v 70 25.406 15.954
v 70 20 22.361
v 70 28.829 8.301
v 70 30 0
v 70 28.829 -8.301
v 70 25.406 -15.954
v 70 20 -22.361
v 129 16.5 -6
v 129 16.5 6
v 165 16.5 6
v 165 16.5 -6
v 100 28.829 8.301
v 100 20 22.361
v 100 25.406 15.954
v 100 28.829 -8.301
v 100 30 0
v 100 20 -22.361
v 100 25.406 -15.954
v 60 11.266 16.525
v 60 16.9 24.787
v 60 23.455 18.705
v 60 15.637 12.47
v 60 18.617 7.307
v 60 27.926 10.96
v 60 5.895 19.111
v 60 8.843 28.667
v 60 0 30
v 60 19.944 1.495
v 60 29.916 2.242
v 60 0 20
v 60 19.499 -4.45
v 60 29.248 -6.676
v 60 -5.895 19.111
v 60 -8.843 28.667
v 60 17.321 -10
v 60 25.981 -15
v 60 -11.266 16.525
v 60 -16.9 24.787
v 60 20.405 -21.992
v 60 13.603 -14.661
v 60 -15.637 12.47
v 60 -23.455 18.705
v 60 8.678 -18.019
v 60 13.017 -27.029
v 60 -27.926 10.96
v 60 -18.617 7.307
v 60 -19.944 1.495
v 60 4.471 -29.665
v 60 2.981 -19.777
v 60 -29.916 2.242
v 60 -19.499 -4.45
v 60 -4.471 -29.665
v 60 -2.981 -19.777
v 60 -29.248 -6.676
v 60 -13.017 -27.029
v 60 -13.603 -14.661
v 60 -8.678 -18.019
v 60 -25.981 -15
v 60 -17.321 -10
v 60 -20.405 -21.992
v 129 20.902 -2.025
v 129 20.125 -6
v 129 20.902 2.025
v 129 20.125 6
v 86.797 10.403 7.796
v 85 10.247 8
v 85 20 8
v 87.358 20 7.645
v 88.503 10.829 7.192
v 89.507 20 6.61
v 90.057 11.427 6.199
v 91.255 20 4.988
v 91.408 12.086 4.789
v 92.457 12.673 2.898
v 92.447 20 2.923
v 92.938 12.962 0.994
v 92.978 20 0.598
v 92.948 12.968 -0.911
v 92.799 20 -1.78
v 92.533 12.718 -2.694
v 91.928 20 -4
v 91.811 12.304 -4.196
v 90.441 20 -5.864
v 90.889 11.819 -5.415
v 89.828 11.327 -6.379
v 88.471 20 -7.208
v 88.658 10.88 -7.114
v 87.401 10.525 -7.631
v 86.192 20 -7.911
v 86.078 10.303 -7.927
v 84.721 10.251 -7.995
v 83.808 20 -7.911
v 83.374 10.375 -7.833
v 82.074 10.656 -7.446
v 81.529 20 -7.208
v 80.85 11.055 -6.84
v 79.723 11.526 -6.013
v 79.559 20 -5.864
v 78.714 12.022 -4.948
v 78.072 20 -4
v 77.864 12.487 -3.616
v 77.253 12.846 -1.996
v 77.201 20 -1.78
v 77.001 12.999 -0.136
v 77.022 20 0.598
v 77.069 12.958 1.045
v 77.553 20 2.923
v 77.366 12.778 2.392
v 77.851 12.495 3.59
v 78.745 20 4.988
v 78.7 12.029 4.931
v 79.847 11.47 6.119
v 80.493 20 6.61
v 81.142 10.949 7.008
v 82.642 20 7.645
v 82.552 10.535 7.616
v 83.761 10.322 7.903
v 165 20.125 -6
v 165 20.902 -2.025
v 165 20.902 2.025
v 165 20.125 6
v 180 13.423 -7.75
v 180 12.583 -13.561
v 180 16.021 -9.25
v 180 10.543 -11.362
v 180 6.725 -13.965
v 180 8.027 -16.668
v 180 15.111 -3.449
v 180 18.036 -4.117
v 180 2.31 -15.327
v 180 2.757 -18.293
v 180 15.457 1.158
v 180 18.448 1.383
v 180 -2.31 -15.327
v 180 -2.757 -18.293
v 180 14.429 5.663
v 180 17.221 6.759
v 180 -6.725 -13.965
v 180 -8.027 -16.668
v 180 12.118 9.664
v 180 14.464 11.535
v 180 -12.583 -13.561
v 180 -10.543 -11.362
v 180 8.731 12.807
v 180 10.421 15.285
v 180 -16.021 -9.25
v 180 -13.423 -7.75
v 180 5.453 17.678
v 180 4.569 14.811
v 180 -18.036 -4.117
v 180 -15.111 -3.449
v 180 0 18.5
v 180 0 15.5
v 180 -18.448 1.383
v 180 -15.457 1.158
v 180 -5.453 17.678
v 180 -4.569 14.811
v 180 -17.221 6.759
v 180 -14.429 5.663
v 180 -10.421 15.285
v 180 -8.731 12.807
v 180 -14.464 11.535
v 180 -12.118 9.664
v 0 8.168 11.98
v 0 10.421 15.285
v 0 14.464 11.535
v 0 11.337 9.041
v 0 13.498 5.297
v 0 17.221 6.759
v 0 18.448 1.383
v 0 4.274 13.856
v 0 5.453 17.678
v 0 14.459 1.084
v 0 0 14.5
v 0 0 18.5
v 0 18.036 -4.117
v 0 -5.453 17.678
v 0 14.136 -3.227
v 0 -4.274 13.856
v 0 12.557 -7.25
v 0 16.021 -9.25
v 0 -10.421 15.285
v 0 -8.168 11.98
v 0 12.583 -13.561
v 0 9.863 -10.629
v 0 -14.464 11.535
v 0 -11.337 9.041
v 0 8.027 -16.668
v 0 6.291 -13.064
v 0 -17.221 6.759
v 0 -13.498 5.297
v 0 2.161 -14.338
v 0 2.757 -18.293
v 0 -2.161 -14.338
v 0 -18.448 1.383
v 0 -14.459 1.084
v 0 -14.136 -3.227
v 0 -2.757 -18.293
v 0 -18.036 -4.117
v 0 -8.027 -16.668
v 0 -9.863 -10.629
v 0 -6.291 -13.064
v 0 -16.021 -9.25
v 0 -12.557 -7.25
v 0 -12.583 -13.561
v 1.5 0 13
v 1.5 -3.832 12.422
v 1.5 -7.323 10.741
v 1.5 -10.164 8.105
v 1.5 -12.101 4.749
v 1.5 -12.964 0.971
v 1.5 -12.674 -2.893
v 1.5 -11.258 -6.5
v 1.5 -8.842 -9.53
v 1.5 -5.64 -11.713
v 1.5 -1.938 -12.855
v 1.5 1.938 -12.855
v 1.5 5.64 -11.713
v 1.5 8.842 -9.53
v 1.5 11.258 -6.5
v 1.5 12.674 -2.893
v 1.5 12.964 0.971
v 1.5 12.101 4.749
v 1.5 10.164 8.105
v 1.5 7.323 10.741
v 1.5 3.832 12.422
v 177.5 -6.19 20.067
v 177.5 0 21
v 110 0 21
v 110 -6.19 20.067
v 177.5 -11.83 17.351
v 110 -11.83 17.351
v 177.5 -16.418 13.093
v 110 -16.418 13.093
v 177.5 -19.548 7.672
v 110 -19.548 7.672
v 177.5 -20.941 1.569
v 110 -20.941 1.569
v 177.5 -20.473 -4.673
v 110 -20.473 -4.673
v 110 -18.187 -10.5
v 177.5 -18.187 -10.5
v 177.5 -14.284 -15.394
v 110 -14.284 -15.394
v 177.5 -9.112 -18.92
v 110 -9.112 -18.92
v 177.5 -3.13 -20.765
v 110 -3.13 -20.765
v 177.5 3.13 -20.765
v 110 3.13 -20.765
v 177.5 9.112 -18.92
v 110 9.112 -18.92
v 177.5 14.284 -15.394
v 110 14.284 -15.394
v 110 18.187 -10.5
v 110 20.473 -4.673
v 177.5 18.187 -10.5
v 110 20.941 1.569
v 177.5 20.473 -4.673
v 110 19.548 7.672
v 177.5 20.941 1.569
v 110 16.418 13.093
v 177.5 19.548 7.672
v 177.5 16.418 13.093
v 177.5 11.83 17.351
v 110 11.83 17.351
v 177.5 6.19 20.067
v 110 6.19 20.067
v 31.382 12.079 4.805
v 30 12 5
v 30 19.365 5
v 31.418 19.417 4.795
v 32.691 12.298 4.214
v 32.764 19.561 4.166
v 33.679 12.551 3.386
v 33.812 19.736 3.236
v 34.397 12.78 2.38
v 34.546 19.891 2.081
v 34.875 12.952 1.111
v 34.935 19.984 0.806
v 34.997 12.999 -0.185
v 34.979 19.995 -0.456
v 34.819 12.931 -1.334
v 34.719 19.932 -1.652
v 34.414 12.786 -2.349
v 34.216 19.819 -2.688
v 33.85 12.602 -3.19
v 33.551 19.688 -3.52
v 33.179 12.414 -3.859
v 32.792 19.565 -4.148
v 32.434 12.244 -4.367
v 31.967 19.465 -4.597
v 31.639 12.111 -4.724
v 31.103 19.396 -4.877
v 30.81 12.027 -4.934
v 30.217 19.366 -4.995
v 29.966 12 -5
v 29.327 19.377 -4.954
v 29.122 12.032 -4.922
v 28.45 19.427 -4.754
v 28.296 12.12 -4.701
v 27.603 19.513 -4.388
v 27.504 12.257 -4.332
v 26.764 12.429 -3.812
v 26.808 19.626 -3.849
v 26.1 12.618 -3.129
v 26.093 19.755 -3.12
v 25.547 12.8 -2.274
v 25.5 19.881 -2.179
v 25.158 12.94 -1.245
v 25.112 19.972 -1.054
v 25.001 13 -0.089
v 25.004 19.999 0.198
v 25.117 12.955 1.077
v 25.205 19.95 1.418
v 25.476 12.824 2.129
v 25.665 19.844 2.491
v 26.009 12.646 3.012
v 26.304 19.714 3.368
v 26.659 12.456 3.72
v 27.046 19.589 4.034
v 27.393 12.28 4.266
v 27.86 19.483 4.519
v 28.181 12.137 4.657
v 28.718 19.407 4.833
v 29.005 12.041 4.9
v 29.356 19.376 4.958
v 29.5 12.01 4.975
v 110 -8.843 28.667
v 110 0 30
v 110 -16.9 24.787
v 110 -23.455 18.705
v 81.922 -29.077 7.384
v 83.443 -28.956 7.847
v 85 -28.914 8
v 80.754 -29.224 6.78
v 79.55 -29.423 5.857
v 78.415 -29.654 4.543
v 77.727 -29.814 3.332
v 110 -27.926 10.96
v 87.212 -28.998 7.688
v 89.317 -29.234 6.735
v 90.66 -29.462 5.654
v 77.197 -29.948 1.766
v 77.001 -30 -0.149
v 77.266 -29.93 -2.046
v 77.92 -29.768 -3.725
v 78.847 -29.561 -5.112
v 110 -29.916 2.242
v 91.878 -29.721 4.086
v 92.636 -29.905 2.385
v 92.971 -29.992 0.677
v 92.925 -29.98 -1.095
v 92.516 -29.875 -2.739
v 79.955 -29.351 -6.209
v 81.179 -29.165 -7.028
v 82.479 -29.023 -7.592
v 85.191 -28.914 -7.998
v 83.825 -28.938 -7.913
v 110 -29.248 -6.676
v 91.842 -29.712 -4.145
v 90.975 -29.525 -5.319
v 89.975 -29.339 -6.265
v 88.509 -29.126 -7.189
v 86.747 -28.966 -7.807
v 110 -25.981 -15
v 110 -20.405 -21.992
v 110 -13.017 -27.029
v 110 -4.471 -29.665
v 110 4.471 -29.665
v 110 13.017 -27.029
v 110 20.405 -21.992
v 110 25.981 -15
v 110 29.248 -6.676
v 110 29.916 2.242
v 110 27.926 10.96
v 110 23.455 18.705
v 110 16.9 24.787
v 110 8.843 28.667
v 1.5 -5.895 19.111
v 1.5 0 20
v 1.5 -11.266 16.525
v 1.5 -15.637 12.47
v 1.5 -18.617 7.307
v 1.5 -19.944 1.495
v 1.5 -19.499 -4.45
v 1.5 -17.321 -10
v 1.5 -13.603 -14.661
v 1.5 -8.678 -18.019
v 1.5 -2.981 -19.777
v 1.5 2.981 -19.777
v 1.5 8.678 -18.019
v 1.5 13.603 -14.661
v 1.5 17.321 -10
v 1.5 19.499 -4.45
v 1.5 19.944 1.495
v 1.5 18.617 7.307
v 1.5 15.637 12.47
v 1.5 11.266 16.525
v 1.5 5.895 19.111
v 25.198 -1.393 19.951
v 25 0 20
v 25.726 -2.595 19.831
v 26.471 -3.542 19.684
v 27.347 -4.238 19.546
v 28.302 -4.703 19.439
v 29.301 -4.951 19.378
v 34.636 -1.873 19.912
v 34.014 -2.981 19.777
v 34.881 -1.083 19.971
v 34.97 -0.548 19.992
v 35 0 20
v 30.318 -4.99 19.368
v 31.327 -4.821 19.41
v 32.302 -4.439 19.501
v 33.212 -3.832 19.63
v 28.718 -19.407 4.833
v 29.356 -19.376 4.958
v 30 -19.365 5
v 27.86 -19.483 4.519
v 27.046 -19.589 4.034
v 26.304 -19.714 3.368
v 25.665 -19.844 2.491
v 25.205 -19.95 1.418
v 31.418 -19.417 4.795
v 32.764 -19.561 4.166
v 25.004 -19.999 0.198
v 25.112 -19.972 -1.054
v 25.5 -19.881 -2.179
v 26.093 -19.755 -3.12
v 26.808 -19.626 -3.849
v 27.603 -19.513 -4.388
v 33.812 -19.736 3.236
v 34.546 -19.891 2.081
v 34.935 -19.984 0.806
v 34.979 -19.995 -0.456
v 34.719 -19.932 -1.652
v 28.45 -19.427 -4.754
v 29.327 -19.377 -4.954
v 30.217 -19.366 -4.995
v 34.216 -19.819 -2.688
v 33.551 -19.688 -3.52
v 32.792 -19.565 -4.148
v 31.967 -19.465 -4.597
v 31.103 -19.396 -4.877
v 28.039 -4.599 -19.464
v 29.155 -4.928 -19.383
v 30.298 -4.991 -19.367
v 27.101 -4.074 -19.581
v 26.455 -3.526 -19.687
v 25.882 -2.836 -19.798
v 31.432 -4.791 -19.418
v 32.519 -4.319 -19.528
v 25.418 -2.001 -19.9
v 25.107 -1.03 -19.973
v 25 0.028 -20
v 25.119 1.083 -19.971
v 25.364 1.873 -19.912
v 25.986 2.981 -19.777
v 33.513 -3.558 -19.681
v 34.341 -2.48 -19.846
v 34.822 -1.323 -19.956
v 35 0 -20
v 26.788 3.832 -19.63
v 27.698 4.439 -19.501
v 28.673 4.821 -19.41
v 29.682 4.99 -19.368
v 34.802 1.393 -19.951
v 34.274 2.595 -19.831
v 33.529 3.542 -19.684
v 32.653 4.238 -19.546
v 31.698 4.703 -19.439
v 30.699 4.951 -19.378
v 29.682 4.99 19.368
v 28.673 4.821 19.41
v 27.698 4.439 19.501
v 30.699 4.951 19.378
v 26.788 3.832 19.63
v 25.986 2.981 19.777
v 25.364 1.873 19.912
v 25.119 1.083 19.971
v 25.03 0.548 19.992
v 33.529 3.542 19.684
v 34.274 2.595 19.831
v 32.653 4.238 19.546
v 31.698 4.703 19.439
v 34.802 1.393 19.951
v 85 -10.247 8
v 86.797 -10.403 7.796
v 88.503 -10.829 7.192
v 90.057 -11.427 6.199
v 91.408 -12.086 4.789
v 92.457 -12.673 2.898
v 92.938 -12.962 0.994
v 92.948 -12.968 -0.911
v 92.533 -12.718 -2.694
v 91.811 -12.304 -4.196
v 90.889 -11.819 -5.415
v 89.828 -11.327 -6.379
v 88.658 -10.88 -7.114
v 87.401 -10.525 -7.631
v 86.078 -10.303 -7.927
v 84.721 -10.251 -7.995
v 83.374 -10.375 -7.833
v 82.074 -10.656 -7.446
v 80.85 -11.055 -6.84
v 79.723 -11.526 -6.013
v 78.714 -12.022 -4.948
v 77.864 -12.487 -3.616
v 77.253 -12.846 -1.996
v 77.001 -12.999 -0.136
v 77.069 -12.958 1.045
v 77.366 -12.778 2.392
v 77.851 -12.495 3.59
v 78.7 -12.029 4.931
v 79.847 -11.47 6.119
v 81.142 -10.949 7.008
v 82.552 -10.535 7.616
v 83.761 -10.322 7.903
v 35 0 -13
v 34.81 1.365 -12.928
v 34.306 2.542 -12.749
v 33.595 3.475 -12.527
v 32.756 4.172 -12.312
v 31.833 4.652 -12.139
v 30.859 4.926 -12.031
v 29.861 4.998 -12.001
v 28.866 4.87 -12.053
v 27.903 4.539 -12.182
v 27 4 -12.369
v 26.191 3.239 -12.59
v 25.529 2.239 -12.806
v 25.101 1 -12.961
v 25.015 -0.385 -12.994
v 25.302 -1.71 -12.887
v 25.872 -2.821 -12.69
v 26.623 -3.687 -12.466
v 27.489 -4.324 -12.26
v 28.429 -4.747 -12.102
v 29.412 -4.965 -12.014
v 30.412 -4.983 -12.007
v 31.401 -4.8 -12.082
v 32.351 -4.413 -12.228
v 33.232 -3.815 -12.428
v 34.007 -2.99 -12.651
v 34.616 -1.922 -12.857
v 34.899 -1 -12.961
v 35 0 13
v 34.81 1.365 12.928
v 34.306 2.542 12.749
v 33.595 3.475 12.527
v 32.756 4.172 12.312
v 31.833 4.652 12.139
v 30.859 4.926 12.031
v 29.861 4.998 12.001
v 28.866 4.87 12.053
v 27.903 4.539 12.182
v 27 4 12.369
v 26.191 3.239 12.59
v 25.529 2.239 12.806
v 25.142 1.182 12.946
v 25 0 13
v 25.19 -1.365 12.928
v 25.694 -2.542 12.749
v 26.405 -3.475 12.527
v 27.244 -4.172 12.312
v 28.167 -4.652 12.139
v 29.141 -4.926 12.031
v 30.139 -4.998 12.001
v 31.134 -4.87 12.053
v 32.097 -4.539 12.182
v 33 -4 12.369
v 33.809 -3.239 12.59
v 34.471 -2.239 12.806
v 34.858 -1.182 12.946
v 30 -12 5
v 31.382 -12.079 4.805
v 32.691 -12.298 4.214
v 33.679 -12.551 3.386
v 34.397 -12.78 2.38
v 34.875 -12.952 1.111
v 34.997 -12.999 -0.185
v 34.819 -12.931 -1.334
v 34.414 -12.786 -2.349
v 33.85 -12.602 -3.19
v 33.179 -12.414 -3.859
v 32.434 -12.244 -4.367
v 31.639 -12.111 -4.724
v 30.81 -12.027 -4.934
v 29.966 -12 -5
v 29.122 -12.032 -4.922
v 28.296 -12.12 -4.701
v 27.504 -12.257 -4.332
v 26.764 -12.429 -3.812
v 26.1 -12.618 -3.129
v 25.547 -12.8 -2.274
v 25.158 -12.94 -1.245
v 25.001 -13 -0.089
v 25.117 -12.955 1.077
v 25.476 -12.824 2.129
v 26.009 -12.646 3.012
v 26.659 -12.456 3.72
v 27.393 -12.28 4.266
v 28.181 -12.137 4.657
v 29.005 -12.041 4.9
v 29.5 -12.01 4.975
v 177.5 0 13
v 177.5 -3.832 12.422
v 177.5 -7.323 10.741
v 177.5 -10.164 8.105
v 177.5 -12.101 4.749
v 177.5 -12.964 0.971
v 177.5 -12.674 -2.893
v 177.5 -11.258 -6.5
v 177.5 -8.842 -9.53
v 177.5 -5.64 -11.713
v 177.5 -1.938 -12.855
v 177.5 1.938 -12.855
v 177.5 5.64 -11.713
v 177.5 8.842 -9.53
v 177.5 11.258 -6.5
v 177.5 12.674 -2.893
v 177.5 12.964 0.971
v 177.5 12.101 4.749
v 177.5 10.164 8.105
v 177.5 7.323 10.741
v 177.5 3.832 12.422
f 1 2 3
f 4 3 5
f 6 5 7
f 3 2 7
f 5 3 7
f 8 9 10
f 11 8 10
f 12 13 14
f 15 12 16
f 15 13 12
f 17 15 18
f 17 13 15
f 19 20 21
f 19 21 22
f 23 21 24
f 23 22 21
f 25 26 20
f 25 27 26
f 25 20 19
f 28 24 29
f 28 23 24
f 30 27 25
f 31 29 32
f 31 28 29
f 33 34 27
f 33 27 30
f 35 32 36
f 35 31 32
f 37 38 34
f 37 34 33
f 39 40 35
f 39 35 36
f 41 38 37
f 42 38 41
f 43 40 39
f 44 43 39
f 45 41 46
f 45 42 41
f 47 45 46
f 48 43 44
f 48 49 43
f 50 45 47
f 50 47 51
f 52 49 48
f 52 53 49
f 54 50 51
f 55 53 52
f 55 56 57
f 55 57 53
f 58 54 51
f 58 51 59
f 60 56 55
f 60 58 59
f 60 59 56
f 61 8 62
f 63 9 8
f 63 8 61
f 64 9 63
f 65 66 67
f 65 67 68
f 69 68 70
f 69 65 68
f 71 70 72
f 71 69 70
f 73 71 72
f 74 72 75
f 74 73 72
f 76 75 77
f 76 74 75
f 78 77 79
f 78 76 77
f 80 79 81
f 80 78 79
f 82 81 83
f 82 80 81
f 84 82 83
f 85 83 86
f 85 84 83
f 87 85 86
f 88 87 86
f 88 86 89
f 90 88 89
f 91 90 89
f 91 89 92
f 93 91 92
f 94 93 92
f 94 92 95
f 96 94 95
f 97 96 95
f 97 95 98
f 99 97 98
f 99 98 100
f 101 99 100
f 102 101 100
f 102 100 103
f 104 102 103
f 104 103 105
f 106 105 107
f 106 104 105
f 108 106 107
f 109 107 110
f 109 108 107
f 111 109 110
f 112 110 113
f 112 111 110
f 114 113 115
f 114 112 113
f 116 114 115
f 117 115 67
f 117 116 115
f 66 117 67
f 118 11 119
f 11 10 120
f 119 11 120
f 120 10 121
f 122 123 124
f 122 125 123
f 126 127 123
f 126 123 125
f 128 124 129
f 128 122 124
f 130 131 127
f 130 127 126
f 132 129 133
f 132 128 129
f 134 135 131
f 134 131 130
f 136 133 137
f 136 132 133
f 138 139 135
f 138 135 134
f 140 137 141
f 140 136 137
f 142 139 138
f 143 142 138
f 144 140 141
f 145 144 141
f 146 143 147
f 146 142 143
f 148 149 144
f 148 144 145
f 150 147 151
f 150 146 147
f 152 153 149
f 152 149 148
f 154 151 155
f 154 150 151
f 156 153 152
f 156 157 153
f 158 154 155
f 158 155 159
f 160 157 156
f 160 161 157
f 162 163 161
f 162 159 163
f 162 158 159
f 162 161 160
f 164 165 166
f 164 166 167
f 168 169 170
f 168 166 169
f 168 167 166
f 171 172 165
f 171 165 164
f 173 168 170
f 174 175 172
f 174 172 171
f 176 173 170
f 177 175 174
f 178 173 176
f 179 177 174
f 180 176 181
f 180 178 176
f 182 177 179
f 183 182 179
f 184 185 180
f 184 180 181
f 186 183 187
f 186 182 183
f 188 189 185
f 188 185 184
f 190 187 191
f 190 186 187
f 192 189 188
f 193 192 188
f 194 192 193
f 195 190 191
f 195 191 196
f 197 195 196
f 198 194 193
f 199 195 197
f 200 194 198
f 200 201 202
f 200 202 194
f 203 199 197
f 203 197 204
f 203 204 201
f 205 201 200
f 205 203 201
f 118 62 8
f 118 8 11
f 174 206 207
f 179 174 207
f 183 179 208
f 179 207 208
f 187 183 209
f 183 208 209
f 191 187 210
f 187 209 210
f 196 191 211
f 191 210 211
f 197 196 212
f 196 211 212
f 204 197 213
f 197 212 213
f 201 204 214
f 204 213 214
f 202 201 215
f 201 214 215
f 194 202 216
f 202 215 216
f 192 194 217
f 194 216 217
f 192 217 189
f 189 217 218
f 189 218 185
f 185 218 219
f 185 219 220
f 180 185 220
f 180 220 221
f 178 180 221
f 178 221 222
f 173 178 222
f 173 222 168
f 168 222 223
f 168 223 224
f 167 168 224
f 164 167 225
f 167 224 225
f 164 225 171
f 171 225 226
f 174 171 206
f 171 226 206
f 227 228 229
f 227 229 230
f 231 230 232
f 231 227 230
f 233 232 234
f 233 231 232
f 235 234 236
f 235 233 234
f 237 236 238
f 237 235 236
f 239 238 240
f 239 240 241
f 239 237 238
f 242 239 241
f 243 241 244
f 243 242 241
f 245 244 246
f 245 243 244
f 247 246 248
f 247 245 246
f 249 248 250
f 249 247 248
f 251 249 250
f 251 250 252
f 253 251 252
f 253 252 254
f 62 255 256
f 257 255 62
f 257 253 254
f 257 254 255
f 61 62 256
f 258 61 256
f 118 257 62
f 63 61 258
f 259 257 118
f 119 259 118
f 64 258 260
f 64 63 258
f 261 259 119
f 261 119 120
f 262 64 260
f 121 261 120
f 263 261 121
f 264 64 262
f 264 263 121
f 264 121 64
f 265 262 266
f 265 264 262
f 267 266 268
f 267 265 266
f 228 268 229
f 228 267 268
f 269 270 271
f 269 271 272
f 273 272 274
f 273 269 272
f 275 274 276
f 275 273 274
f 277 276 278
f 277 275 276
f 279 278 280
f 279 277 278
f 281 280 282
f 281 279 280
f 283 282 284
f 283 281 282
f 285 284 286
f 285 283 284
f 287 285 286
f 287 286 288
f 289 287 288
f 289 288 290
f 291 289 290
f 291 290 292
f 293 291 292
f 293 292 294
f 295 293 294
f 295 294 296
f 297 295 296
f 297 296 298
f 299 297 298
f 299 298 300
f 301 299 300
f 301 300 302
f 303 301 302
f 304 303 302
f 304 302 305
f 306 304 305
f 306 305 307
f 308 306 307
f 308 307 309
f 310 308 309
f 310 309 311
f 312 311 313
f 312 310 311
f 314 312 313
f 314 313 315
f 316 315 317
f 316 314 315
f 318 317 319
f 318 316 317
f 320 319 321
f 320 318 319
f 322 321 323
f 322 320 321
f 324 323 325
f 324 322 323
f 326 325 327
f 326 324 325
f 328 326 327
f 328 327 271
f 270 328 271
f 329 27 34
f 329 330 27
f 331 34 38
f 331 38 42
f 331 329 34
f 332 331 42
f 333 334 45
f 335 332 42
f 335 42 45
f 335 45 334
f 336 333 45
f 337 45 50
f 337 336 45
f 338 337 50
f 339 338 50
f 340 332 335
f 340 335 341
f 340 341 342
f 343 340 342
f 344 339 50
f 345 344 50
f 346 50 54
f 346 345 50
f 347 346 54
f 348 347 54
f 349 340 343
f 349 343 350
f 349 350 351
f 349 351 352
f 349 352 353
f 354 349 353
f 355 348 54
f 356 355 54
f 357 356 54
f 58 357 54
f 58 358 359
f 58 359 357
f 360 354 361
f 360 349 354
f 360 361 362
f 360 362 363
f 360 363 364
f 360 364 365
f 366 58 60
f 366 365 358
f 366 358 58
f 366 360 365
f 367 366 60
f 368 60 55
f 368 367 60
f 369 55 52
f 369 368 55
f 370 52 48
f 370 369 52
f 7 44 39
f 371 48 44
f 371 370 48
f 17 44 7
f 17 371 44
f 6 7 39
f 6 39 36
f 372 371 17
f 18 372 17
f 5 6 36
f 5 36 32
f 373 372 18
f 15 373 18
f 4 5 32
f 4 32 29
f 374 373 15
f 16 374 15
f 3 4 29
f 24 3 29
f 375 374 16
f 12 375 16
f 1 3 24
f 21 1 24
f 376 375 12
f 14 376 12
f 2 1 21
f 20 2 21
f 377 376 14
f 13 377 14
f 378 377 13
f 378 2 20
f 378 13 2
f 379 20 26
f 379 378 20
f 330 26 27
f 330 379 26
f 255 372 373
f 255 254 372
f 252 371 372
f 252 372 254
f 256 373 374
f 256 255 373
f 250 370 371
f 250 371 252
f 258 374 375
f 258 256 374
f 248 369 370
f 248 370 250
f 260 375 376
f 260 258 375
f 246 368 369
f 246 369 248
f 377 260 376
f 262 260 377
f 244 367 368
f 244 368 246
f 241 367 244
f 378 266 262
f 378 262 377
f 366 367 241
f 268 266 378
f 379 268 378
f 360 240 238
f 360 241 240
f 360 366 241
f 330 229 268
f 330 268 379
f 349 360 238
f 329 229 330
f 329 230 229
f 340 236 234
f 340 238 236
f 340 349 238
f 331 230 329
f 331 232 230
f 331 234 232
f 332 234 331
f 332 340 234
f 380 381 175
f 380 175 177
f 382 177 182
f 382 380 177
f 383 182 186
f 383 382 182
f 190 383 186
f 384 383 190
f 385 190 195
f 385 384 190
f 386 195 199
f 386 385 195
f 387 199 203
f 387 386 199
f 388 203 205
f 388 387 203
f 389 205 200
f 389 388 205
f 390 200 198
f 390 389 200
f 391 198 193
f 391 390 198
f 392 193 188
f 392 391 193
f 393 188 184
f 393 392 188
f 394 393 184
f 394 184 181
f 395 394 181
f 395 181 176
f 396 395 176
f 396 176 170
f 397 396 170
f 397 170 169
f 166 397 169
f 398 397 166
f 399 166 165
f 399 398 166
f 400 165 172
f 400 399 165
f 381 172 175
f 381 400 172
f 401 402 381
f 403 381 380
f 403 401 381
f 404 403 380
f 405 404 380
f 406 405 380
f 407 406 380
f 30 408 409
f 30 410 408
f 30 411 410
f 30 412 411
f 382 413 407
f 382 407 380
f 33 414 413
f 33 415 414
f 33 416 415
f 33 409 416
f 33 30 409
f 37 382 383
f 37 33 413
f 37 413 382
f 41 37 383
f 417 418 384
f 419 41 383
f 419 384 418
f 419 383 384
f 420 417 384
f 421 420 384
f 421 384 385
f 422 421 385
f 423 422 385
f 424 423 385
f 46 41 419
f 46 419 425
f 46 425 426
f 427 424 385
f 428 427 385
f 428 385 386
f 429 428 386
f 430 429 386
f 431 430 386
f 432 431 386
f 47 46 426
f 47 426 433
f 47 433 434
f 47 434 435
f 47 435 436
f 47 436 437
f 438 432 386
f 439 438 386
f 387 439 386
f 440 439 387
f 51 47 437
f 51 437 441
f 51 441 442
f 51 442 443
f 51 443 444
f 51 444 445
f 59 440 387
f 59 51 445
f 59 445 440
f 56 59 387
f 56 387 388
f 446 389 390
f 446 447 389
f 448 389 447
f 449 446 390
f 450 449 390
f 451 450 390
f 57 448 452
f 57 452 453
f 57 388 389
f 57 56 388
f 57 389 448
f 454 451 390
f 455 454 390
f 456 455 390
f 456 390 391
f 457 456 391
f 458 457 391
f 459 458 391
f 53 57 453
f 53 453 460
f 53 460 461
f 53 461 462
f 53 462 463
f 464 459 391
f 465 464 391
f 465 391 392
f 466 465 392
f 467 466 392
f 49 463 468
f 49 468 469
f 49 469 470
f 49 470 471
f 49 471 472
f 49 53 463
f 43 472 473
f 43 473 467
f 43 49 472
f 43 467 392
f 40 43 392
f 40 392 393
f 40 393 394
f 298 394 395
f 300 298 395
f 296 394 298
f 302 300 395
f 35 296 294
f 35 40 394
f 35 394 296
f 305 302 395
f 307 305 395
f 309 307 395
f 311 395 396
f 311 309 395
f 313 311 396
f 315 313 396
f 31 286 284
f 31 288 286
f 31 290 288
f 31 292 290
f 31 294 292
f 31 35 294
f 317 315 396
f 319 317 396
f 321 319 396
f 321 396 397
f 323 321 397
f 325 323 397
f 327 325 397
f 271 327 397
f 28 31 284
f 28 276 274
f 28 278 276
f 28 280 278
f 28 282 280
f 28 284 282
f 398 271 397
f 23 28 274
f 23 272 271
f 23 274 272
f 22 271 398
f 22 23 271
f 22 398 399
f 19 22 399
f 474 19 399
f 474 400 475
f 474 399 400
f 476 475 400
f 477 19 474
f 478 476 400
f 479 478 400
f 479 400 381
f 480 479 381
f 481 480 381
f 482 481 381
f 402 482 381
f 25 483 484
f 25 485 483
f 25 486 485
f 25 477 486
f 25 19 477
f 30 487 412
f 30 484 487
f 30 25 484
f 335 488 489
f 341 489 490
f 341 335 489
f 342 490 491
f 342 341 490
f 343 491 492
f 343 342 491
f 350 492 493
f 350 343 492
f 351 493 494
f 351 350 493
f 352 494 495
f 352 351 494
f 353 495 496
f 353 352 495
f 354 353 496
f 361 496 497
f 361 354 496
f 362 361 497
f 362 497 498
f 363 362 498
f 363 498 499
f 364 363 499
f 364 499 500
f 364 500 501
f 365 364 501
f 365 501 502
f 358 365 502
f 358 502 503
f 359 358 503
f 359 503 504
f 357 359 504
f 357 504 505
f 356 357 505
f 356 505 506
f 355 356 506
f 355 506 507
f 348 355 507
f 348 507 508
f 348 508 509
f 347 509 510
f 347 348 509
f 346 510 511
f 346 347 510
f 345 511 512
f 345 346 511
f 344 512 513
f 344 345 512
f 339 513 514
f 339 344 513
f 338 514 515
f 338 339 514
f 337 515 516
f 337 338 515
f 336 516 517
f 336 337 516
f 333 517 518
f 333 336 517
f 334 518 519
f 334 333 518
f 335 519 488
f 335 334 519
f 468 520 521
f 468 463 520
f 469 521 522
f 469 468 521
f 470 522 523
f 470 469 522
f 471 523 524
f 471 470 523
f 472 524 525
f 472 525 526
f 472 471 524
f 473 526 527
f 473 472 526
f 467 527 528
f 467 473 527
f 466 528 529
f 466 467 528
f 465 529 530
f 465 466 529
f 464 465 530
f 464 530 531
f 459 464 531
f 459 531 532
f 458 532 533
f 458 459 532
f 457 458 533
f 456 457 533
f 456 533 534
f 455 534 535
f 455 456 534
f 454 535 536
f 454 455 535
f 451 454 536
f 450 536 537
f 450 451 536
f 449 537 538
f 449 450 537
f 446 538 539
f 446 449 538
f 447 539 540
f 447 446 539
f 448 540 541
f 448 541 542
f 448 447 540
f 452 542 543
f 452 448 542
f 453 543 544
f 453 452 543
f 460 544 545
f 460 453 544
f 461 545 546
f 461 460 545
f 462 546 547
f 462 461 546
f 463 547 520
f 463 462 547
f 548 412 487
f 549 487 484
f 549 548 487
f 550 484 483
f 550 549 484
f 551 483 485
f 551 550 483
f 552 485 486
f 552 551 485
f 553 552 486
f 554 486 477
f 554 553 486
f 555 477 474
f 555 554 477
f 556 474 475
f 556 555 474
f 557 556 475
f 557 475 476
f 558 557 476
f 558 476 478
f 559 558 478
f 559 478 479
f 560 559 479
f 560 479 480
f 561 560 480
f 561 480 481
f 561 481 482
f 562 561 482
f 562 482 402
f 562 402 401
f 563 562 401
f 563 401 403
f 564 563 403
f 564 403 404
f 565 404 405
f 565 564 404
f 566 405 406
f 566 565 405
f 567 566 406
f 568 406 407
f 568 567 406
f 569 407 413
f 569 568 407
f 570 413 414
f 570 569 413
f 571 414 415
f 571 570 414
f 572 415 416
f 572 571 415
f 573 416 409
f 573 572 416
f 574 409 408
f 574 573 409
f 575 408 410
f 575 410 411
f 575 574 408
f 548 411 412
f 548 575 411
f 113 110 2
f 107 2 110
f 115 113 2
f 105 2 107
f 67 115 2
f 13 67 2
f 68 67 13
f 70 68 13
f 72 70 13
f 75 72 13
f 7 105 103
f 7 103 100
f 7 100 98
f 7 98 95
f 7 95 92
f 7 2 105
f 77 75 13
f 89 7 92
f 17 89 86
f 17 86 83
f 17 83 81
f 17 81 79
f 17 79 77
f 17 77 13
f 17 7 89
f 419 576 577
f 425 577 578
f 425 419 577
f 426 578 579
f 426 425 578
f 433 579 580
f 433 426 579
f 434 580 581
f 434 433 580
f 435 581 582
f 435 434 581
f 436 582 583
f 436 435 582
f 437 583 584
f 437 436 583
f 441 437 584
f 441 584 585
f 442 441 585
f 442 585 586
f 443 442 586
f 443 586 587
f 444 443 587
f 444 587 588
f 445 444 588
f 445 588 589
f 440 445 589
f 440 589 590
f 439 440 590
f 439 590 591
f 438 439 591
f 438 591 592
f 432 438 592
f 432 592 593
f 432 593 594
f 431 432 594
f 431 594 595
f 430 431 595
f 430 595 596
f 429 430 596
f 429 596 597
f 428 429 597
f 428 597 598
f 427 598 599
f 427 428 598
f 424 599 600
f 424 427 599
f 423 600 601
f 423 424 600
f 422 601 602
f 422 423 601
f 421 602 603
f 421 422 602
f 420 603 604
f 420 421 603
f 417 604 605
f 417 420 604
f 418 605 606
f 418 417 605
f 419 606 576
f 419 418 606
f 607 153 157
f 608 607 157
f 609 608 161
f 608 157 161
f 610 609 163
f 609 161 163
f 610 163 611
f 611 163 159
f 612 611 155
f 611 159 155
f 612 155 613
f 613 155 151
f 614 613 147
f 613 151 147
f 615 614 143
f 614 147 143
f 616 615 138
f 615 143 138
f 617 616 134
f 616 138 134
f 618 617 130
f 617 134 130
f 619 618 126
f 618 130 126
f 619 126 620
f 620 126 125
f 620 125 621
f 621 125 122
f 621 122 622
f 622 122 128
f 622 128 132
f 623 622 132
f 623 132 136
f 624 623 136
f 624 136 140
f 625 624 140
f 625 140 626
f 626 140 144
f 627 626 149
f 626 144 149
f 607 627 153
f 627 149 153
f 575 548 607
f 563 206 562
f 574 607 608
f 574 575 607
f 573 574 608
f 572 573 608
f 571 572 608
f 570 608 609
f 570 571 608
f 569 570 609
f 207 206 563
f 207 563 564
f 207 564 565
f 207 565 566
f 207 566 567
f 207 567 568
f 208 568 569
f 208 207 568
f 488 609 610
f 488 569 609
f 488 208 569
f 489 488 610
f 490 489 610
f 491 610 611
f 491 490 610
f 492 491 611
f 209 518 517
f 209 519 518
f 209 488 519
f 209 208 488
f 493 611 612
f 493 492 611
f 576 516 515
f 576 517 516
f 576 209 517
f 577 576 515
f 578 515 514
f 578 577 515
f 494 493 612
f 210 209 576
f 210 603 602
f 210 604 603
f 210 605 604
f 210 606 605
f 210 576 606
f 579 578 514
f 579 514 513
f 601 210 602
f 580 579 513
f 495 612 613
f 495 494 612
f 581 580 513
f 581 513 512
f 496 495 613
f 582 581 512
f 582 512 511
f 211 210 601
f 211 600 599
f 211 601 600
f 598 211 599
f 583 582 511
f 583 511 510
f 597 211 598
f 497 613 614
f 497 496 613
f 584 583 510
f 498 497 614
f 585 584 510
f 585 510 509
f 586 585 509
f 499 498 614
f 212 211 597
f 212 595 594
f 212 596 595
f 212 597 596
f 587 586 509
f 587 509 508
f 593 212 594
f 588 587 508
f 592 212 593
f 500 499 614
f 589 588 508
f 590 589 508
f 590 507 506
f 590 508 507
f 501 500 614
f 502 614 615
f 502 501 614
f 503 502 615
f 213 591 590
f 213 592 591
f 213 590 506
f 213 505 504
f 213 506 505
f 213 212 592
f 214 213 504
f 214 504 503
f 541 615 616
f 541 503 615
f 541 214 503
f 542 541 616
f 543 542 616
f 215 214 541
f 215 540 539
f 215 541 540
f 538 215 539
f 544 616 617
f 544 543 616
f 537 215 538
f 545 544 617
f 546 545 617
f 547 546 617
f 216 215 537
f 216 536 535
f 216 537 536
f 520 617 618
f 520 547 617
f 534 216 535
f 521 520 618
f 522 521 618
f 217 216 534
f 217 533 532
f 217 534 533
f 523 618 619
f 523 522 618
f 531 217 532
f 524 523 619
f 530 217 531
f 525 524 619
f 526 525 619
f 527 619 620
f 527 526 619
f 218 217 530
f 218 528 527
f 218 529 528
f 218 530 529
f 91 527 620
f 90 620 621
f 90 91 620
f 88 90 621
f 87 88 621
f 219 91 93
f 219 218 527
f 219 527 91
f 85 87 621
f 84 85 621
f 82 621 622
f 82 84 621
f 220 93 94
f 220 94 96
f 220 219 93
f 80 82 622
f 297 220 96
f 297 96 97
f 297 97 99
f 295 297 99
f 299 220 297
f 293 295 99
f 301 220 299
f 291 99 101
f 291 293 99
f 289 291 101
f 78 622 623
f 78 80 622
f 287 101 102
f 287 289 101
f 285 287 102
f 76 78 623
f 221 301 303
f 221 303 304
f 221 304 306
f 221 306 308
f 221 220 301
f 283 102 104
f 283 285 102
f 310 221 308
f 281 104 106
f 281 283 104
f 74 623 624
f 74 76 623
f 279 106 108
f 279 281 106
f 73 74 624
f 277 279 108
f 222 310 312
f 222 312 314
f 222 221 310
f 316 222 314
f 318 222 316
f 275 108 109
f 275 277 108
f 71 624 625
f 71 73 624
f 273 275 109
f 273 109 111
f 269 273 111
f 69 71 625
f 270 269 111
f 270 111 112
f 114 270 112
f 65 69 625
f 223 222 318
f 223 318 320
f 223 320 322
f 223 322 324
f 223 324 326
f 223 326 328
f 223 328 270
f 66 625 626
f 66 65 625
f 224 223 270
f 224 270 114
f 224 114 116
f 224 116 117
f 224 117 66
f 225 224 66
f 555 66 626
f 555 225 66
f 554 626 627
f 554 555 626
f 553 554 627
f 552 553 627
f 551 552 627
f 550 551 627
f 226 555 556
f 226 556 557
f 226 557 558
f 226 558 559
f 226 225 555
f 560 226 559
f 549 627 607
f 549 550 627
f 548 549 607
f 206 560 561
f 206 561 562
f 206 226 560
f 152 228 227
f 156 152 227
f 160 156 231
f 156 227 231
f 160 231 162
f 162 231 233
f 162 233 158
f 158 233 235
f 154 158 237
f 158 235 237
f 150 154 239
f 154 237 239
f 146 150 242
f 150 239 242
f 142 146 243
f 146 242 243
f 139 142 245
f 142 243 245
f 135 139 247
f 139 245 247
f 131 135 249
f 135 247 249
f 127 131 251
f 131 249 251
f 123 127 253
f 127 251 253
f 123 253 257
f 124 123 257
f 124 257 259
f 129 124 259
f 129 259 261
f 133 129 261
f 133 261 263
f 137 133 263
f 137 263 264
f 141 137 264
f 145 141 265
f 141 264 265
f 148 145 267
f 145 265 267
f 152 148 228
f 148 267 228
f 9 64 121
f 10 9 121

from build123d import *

# Parameters (mm, degrees)
CUT_EXTRUDE_1_DEPTH      = 185.932420089
CUT_EXTRUDE_1_DEPTH_BACK = 185.932420089
SKETCH_2_W               = 30
SKETCH_2_H               = 10
CUT_EXTRUDE_2_DEPTH      = 185.932420089
CUT_EXTRUDE_2_DEPTH_BACK = 185.932420089
SKETCH_3_R               = 5
SKETCH_3_R_2             = 8
CUT_EXTRUDE_3_DEPTH      = 185.932420219
CUT_EXTRUDE_3_DEPTH_BACK = 185.932420219
SKETCH_5_R               = 5
SKETCH_6_W               = 36
SKETCH_6_H               = 4.5
CUT_EXTRUDE_4_DEPTH      = 6
CHAMFER_1_SIZE           = 1.5
CHAMFER_2_SIZE           = 2.5


with BuildPart() as part:
    # Эскиз1 → Повернуть1 (revolve)
    with BuildSketch(Plane.XY, mode=Mode.PRIVATE) as revolve_1_sk:
        Polygon((0, 13), (0, 20), (60, 20), (60, 30), (110, 30), (110, 21), (180, 21), (180, 13), align=None)
    revolve(revolve_1_sk.sketch.rotate(Axis((0, 0, 0), (1, 0, 0)), 90), axis=Axis((0, 0, 0), (1, 0, 0)))

    # Эскиз2 → Вырез-Вытянуть1 (cut, two sides: drawn at the far end of the back side and taken through both)
    with BuildSketch(Plane.XY.offset(-CUT_EXTRUDE_1_DEPTH_BACK)):
        with Locations((85, 25)):
            Rectangle(SKETCH_2_W, SKETCH_2_H)
    extrude(amount=CUT_EXTRUDE_1_DEPTH + CUT_EXTRUDE_1_DEPTH_BACK, mode=Mode.SUBTRACT)

    # Эскиз3 → Вырез-Вытянуть2 (cut, two sides: drawn at the far end of the back side and taken through both)
    with BuildSketch(Plane(origin=(0, 0, 0), x_dir=(1, 0, 0), z_dir=(0, 1, 0)).offset(-CUT_EXTRUDE_2_DEPTH_BACK)):
        with Locations(Location((30, 0, 0), (0, 0, 270))):
            Circle(SKETCH_3_R)
        with Locations(Location((85, 0, 0), (0, 0, 270))):
            Circle(SKETCH_3_R_2)
    extrude(amount=CUT_EXTRUDE_2_DEPTH + CUT_EXTRUDE_2_DEPTH_BACK, mode=Mode.SUBTRACT)

    # Эскиз5 → Вырез-Вытянуть3 (cut, two sides: drawn at the far end of the back side and taken through both)
    with BuildSketch(Plane.XY.offset(-CUT_EXTRUDE_3_DEPTH_BACK)):
        with Locations((30, 0)):
            Circle(SKETCH_5_R)
    extrude(amount=CUT_EXTRUDE_3_DEPTH + CUT_EXTRUDE_3_DEPTH_BACK, mode=Mode.SUBTRACT)

    # Эскиз6 → Вырез-Вытянуть4 (cut, symmetric)
    with BuildSketch(Plane.XY):
        with Locations((147, 18.75)):
            Rectangle(SKETCH_6_W, SKETCH_6_H)
    extrude(amount=CUT_EXTRUDE_4_DEPTH, both=True, mode=Mode.SUBTRACT)

    # Фаска1
    chamfer_1_edges = [part.edges().sort_by_distance(p)[0] for p in [
        (0, 0, -13),
        (0, 0, -20),
    ]]
    chamfer(chamfer_1_edges, length=CHAMFER_1_SIZE)

    # Фаска2
    chamfer_2_edges = [part.edges().sort_by_distance(p)[0] for p in [
        (180, 0, -13),
        (180, 0, -21),
    ]]
    chamfer(chamfer_2_edges, length=CHAMFER_2_SIZE)


solid = part.part
